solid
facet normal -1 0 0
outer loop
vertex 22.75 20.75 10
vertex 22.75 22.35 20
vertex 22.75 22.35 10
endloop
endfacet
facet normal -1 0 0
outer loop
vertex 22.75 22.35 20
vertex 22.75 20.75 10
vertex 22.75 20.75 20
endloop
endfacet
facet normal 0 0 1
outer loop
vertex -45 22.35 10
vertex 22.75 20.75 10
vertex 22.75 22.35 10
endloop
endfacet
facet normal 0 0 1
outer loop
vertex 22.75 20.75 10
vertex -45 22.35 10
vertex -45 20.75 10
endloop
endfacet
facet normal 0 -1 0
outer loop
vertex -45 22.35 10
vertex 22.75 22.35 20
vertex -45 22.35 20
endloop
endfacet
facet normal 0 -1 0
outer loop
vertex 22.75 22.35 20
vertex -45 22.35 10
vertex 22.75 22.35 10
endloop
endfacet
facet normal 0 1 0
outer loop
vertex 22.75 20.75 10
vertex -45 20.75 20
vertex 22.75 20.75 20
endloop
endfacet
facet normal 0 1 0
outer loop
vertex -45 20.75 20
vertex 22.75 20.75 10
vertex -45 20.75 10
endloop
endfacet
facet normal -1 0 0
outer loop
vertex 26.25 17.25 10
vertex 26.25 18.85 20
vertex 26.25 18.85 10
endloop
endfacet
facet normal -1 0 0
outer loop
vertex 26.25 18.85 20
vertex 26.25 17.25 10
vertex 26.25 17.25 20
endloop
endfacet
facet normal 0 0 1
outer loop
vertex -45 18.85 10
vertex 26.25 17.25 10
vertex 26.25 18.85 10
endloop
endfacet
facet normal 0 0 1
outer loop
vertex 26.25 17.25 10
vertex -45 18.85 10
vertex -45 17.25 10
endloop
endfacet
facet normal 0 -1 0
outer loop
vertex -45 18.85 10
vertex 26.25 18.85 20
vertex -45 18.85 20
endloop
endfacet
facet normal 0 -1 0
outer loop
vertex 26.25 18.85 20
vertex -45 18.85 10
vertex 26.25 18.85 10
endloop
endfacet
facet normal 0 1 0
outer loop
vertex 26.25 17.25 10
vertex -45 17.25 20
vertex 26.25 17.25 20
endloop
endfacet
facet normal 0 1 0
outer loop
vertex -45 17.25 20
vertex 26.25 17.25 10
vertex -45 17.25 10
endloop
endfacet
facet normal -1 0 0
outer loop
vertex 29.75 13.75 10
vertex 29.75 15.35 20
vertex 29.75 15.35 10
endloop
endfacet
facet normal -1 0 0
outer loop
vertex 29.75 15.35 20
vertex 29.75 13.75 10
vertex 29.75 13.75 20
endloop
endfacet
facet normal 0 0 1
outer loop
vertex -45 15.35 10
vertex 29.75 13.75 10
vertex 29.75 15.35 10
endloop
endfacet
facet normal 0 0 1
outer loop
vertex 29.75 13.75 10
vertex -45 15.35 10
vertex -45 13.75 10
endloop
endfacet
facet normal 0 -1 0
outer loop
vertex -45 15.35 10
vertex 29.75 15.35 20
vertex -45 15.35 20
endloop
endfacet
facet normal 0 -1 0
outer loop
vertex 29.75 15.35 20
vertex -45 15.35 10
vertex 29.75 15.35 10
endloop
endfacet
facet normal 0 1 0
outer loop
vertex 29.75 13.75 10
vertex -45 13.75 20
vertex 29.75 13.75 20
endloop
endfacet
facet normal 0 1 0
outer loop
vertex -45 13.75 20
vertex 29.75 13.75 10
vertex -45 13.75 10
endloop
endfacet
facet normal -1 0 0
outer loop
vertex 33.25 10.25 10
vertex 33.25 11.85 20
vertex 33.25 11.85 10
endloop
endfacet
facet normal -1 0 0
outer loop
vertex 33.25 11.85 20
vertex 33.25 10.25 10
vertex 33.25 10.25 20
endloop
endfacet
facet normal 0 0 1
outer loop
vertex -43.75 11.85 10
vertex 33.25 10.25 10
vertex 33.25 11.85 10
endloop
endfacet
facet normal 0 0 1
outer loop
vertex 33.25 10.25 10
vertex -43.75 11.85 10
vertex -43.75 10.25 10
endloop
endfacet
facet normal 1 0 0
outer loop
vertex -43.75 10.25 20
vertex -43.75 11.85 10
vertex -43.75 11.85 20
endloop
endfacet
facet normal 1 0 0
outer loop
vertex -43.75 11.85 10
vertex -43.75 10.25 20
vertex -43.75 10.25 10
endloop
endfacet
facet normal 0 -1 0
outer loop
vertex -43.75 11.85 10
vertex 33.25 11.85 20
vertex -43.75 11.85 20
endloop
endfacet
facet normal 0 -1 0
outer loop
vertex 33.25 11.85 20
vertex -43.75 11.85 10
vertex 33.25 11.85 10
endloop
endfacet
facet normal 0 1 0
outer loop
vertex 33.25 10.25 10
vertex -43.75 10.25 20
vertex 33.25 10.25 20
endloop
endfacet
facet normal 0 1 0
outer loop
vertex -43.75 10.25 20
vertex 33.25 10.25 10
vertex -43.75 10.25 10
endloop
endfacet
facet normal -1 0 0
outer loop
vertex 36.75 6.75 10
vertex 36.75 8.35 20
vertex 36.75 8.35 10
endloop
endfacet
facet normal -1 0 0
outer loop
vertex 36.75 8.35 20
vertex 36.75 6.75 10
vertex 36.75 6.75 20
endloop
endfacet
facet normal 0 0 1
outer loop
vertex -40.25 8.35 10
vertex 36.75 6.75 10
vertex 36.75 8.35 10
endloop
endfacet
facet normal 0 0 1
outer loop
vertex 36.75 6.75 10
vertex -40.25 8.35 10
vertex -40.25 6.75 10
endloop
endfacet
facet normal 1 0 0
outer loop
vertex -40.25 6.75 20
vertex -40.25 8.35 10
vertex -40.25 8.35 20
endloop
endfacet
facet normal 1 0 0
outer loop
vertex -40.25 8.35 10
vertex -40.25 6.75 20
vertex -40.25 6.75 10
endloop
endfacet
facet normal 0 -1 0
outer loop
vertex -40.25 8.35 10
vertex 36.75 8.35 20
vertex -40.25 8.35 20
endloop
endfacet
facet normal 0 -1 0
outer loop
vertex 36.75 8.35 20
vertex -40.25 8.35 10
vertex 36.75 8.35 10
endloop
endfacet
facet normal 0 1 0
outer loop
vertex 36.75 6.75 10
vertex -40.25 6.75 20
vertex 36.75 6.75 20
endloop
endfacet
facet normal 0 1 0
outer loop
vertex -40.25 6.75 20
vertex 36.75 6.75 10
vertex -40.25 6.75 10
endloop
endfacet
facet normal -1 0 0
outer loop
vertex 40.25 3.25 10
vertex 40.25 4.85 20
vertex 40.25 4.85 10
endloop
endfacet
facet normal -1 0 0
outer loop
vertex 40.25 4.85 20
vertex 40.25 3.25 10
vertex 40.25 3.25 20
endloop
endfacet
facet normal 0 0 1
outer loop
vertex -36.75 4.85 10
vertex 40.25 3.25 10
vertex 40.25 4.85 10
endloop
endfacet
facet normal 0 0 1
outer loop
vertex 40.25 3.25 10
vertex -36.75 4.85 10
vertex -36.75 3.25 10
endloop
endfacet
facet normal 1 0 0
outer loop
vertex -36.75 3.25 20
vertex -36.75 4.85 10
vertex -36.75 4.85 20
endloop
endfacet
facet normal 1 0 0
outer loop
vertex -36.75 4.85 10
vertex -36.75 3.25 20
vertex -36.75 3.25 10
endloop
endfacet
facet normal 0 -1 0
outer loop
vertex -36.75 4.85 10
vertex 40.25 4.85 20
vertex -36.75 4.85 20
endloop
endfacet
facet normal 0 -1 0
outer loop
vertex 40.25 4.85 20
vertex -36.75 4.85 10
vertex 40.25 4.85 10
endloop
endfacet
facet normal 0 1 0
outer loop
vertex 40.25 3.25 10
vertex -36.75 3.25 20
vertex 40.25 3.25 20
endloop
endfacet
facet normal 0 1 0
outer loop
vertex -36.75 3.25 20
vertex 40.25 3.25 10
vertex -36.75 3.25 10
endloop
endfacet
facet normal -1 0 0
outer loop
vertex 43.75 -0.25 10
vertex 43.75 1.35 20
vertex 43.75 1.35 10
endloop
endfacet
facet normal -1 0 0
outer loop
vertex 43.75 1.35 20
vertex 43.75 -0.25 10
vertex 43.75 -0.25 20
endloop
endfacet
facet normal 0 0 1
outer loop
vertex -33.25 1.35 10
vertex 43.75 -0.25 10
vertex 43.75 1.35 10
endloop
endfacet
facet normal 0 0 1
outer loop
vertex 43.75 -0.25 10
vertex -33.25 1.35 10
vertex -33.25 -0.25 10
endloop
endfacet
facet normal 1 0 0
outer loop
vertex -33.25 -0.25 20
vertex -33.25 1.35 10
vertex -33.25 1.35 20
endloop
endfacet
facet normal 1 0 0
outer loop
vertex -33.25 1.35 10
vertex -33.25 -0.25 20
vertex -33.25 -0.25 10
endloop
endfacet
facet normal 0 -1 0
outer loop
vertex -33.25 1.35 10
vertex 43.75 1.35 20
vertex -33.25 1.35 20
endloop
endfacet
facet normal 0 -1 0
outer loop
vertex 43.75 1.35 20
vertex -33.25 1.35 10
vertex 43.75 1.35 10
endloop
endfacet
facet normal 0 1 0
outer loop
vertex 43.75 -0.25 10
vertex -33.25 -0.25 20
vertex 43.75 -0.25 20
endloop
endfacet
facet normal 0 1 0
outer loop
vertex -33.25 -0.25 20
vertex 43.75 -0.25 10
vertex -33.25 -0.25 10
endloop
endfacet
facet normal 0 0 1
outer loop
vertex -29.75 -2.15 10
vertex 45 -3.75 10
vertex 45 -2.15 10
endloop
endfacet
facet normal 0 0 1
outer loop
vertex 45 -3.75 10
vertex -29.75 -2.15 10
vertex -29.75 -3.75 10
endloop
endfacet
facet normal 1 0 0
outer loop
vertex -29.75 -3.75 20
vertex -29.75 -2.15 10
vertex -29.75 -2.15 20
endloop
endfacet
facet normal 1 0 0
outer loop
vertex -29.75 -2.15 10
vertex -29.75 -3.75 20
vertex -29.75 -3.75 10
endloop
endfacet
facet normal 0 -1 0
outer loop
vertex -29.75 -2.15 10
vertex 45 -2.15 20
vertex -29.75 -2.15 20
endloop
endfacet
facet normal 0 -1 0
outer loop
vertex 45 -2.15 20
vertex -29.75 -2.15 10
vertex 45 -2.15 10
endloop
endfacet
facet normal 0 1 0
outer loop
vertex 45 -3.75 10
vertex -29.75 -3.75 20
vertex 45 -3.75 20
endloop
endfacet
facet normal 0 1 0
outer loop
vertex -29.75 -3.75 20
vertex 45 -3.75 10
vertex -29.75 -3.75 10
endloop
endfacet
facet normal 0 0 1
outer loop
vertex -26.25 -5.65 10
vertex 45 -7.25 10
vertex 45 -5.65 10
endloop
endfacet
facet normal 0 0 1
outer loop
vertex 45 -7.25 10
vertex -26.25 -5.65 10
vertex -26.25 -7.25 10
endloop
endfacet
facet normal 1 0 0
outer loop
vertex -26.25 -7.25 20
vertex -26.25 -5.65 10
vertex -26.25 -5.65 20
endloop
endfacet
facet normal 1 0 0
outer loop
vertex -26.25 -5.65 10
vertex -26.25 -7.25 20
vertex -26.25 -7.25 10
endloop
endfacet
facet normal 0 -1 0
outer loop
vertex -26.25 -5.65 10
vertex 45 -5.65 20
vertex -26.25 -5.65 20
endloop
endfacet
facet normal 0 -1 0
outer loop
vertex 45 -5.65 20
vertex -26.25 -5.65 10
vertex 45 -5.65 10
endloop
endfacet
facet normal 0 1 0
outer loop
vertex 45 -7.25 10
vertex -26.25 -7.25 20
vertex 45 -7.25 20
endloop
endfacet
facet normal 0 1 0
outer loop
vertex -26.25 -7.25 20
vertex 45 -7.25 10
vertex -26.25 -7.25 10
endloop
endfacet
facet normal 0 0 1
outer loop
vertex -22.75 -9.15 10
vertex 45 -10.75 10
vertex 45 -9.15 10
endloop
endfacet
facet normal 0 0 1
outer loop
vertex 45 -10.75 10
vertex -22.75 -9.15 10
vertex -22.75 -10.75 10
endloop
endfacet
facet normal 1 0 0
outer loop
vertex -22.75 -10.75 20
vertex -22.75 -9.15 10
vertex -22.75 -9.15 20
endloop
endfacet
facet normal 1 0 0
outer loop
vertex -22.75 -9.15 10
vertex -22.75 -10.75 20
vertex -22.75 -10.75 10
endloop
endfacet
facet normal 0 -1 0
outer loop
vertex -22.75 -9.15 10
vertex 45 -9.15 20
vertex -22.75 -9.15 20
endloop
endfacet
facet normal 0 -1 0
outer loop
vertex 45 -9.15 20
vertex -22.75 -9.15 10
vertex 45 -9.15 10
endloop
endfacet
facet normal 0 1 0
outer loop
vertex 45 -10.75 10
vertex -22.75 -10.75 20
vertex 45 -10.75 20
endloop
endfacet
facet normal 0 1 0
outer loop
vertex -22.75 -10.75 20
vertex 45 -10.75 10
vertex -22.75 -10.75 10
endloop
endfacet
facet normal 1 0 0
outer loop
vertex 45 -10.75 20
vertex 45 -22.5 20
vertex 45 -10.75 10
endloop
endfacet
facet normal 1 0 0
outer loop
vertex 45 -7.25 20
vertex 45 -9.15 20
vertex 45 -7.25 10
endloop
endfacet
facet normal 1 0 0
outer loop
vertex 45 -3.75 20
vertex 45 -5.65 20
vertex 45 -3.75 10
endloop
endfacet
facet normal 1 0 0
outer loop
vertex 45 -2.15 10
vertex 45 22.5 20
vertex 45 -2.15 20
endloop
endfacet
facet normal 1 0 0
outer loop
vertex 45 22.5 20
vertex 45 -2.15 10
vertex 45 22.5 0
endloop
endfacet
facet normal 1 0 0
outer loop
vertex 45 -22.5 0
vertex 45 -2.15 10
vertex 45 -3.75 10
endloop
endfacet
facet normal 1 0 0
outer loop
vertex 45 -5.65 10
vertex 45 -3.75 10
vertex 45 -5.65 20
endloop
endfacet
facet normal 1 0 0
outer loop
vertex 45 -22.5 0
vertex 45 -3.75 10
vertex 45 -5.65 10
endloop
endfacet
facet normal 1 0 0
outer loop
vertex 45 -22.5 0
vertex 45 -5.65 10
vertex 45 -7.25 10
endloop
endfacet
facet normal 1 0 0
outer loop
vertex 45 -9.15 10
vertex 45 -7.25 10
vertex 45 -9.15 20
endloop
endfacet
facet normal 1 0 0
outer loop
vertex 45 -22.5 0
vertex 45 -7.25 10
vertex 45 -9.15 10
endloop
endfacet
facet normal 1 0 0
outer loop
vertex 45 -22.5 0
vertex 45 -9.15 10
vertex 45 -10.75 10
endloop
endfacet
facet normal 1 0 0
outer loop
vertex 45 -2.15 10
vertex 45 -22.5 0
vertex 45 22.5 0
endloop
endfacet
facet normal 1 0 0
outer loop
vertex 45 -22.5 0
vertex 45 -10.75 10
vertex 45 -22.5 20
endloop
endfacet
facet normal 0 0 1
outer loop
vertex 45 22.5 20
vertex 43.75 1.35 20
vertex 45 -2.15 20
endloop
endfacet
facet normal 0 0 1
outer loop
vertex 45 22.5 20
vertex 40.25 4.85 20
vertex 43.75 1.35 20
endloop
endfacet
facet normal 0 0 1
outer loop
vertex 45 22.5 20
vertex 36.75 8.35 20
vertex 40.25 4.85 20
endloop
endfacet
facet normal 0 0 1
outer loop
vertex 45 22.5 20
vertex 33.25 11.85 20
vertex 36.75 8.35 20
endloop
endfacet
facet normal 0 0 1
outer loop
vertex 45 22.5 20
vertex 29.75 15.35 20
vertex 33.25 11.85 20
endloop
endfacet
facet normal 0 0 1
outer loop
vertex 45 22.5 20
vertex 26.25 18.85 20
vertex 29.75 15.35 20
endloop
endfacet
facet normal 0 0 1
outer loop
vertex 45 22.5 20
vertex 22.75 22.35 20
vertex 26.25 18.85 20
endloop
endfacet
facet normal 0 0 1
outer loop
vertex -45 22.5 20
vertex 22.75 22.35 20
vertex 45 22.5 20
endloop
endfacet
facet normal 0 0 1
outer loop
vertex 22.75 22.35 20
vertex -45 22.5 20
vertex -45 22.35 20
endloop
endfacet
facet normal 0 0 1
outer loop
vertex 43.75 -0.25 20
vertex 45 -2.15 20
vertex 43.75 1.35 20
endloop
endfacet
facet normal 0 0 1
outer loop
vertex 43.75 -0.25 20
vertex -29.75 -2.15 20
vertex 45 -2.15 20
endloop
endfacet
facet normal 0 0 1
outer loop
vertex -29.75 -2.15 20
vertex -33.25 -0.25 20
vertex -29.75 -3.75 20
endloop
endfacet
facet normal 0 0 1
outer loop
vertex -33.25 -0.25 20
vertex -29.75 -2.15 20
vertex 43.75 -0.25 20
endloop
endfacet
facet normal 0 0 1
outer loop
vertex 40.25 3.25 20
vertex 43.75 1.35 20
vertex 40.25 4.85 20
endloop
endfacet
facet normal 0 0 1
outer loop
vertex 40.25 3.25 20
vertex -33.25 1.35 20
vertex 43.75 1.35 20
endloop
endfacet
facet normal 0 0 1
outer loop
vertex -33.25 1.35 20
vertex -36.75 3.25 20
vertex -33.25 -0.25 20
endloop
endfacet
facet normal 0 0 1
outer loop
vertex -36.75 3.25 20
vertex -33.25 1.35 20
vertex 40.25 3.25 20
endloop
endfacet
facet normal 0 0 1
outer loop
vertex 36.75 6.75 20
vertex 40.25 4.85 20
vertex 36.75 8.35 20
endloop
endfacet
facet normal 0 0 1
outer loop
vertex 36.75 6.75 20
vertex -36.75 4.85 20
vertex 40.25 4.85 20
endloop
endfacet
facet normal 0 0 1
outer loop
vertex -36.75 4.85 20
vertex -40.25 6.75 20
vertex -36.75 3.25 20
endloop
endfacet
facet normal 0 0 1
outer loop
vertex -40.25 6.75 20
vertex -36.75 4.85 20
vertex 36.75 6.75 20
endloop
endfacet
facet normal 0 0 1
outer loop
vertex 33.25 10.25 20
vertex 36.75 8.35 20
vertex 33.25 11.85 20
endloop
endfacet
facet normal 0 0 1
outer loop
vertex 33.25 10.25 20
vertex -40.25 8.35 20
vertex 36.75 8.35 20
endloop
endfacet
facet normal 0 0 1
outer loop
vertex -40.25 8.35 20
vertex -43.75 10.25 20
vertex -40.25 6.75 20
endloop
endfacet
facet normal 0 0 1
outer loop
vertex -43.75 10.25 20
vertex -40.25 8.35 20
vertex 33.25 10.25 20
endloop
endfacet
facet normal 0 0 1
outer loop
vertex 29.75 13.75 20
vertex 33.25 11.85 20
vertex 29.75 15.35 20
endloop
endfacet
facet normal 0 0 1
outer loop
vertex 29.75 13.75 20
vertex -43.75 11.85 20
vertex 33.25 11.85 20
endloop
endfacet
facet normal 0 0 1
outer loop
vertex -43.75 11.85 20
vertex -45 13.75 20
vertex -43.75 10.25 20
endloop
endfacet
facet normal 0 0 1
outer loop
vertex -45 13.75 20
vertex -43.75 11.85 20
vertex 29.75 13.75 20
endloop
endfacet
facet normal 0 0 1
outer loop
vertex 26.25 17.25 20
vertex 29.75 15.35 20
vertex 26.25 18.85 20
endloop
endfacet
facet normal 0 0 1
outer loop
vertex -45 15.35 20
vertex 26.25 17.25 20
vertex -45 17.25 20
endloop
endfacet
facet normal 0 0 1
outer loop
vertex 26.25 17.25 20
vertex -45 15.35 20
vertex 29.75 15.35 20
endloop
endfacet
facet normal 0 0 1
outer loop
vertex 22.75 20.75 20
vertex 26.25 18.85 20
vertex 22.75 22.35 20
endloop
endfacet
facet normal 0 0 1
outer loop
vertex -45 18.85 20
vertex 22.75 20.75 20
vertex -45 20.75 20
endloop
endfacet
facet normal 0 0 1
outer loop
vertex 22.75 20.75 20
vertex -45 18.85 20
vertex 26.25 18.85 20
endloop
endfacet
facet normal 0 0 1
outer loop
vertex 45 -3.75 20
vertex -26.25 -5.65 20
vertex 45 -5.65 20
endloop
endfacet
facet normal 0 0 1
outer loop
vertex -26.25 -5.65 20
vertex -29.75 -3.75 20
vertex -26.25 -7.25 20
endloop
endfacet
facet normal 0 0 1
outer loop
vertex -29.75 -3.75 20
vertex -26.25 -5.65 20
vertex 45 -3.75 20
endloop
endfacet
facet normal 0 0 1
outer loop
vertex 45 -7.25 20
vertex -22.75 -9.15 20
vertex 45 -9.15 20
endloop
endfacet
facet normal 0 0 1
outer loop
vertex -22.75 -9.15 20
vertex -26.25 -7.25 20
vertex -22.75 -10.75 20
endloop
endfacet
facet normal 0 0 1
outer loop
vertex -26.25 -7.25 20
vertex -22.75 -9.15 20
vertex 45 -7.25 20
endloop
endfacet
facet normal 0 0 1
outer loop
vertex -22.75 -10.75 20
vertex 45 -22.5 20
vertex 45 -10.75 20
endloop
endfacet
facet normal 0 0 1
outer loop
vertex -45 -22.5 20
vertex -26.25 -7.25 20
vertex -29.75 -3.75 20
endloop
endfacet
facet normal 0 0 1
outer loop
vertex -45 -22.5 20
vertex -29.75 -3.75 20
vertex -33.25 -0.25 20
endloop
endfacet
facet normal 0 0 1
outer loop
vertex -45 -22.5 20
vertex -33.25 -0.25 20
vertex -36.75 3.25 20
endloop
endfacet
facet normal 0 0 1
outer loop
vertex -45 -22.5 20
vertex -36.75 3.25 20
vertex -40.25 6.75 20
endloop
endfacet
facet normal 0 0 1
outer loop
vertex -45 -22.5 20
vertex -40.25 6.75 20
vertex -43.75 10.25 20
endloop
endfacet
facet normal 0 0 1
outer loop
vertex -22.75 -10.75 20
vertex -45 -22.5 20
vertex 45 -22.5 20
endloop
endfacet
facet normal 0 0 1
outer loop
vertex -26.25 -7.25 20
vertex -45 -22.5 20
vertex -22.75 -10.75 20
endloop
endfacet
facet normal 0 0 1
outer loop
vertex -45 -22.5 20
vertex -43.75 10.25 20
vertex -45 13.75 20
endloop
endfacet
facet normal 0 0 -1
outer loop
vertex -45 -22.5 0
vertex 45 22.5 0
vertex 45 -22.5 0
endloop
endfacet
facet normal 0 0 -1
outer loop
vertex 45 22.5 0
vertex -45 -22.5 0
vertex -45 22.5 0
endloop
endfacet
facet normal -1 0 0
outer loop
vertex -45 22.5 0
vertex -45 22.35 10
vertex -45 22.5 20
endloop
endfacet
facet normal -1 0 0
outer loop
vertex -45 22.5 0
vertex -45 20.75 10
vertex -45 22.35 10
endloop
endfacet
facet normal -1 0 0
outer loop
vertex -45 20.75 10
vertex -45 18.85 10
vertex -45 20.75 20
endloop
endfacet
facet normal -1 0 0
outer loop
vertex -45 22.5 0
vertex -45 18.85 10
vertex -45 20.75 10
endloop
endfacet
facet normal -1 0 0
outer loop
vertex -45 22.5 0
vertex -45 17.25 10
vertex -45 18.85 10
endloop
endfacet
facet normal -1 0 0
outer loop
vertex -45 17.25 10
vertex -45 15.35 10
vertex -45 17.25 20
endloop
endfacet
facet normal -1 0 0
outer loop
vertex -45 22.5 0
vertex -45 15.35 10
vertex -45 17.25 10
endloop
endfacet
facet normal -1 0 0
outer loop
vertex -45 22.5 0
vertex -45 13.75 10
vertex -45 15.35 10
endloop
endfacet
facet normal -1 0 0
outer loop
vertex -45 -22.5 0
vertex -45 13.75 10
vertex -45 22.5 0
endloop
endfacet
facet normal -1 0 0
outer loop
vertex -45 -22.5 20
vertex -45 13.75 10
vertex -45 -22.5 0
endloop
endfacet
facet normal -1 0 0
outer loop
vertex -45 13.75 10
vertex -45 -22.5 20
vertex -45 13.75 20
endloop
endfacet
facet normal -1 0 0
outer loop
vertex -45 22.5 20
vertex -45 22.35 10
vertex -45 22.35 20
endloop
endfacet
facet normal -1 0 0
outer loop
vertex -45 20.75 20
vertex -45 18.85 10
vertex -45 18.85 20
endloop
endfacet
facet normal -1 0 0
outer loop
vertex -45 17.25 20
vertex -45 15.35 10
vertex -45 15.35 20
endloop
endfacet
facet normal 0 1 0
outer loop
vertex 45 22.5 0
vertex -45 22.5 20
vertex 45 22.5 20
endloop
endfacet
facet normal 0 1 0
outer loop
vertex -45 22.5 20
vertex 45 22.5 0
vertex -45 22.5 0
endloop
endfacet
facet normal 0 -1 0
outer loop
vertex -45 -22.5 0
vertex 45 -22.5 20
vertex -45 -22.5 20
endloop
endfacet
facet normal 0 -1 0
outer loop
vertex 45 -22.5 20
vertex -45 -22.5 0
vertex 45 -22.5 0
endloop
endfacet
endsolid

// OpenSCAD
// Slide drying rack - holds 10 microscope slides standing upright on their long edge
// Units: mm. Print orientation: base on XY plane, slots open upward (+Z).

// ---------- Block ----------
block_len   = 90;    // block length along X
block_wid   = 45;    // block width along Y
block_ht    = 20;    // block height along Z

// ---------- Slots ----------
slot_count  = 10;    // number of slide slots
slot_len    = 77;    // slot length along X
slot_wid    = 1.6;   // slot width along Y
slot_depth  = 10;    // slot depth from top face (along -Z)
slot_pitch  = 3.5;   // centre-to-centre spacing along Y

// ---------- Misc ----------
eps         = 0.5;   // cutter overshoot past top face
$fn         = 64;    // curve resolution (set per rules)

// X position of the first slot so the row is centred on the block
slot_x0 = -(slot_count - 1) * slot_pitch / 2;

difference() {
    // Solid base block, centred in X and Y, resting on z = 0
    translate([-block_len / 2, -block_wid / 2, 0])
        cube([block_len, block_wid, block_ht]);

    // Parallel slots cut into the top face, open at the top
    for (i = [0 : slot_count - 1])
        translate([slot_x0 + i * slot_pitch - slot_len / 2,
                   block_wid / 2 - slot_pitch / 2 - i * slot_pitch,
                   block_ht - slot_depth])
            cube([slot_len, slot_wid, slot_depth + eps]);
}
